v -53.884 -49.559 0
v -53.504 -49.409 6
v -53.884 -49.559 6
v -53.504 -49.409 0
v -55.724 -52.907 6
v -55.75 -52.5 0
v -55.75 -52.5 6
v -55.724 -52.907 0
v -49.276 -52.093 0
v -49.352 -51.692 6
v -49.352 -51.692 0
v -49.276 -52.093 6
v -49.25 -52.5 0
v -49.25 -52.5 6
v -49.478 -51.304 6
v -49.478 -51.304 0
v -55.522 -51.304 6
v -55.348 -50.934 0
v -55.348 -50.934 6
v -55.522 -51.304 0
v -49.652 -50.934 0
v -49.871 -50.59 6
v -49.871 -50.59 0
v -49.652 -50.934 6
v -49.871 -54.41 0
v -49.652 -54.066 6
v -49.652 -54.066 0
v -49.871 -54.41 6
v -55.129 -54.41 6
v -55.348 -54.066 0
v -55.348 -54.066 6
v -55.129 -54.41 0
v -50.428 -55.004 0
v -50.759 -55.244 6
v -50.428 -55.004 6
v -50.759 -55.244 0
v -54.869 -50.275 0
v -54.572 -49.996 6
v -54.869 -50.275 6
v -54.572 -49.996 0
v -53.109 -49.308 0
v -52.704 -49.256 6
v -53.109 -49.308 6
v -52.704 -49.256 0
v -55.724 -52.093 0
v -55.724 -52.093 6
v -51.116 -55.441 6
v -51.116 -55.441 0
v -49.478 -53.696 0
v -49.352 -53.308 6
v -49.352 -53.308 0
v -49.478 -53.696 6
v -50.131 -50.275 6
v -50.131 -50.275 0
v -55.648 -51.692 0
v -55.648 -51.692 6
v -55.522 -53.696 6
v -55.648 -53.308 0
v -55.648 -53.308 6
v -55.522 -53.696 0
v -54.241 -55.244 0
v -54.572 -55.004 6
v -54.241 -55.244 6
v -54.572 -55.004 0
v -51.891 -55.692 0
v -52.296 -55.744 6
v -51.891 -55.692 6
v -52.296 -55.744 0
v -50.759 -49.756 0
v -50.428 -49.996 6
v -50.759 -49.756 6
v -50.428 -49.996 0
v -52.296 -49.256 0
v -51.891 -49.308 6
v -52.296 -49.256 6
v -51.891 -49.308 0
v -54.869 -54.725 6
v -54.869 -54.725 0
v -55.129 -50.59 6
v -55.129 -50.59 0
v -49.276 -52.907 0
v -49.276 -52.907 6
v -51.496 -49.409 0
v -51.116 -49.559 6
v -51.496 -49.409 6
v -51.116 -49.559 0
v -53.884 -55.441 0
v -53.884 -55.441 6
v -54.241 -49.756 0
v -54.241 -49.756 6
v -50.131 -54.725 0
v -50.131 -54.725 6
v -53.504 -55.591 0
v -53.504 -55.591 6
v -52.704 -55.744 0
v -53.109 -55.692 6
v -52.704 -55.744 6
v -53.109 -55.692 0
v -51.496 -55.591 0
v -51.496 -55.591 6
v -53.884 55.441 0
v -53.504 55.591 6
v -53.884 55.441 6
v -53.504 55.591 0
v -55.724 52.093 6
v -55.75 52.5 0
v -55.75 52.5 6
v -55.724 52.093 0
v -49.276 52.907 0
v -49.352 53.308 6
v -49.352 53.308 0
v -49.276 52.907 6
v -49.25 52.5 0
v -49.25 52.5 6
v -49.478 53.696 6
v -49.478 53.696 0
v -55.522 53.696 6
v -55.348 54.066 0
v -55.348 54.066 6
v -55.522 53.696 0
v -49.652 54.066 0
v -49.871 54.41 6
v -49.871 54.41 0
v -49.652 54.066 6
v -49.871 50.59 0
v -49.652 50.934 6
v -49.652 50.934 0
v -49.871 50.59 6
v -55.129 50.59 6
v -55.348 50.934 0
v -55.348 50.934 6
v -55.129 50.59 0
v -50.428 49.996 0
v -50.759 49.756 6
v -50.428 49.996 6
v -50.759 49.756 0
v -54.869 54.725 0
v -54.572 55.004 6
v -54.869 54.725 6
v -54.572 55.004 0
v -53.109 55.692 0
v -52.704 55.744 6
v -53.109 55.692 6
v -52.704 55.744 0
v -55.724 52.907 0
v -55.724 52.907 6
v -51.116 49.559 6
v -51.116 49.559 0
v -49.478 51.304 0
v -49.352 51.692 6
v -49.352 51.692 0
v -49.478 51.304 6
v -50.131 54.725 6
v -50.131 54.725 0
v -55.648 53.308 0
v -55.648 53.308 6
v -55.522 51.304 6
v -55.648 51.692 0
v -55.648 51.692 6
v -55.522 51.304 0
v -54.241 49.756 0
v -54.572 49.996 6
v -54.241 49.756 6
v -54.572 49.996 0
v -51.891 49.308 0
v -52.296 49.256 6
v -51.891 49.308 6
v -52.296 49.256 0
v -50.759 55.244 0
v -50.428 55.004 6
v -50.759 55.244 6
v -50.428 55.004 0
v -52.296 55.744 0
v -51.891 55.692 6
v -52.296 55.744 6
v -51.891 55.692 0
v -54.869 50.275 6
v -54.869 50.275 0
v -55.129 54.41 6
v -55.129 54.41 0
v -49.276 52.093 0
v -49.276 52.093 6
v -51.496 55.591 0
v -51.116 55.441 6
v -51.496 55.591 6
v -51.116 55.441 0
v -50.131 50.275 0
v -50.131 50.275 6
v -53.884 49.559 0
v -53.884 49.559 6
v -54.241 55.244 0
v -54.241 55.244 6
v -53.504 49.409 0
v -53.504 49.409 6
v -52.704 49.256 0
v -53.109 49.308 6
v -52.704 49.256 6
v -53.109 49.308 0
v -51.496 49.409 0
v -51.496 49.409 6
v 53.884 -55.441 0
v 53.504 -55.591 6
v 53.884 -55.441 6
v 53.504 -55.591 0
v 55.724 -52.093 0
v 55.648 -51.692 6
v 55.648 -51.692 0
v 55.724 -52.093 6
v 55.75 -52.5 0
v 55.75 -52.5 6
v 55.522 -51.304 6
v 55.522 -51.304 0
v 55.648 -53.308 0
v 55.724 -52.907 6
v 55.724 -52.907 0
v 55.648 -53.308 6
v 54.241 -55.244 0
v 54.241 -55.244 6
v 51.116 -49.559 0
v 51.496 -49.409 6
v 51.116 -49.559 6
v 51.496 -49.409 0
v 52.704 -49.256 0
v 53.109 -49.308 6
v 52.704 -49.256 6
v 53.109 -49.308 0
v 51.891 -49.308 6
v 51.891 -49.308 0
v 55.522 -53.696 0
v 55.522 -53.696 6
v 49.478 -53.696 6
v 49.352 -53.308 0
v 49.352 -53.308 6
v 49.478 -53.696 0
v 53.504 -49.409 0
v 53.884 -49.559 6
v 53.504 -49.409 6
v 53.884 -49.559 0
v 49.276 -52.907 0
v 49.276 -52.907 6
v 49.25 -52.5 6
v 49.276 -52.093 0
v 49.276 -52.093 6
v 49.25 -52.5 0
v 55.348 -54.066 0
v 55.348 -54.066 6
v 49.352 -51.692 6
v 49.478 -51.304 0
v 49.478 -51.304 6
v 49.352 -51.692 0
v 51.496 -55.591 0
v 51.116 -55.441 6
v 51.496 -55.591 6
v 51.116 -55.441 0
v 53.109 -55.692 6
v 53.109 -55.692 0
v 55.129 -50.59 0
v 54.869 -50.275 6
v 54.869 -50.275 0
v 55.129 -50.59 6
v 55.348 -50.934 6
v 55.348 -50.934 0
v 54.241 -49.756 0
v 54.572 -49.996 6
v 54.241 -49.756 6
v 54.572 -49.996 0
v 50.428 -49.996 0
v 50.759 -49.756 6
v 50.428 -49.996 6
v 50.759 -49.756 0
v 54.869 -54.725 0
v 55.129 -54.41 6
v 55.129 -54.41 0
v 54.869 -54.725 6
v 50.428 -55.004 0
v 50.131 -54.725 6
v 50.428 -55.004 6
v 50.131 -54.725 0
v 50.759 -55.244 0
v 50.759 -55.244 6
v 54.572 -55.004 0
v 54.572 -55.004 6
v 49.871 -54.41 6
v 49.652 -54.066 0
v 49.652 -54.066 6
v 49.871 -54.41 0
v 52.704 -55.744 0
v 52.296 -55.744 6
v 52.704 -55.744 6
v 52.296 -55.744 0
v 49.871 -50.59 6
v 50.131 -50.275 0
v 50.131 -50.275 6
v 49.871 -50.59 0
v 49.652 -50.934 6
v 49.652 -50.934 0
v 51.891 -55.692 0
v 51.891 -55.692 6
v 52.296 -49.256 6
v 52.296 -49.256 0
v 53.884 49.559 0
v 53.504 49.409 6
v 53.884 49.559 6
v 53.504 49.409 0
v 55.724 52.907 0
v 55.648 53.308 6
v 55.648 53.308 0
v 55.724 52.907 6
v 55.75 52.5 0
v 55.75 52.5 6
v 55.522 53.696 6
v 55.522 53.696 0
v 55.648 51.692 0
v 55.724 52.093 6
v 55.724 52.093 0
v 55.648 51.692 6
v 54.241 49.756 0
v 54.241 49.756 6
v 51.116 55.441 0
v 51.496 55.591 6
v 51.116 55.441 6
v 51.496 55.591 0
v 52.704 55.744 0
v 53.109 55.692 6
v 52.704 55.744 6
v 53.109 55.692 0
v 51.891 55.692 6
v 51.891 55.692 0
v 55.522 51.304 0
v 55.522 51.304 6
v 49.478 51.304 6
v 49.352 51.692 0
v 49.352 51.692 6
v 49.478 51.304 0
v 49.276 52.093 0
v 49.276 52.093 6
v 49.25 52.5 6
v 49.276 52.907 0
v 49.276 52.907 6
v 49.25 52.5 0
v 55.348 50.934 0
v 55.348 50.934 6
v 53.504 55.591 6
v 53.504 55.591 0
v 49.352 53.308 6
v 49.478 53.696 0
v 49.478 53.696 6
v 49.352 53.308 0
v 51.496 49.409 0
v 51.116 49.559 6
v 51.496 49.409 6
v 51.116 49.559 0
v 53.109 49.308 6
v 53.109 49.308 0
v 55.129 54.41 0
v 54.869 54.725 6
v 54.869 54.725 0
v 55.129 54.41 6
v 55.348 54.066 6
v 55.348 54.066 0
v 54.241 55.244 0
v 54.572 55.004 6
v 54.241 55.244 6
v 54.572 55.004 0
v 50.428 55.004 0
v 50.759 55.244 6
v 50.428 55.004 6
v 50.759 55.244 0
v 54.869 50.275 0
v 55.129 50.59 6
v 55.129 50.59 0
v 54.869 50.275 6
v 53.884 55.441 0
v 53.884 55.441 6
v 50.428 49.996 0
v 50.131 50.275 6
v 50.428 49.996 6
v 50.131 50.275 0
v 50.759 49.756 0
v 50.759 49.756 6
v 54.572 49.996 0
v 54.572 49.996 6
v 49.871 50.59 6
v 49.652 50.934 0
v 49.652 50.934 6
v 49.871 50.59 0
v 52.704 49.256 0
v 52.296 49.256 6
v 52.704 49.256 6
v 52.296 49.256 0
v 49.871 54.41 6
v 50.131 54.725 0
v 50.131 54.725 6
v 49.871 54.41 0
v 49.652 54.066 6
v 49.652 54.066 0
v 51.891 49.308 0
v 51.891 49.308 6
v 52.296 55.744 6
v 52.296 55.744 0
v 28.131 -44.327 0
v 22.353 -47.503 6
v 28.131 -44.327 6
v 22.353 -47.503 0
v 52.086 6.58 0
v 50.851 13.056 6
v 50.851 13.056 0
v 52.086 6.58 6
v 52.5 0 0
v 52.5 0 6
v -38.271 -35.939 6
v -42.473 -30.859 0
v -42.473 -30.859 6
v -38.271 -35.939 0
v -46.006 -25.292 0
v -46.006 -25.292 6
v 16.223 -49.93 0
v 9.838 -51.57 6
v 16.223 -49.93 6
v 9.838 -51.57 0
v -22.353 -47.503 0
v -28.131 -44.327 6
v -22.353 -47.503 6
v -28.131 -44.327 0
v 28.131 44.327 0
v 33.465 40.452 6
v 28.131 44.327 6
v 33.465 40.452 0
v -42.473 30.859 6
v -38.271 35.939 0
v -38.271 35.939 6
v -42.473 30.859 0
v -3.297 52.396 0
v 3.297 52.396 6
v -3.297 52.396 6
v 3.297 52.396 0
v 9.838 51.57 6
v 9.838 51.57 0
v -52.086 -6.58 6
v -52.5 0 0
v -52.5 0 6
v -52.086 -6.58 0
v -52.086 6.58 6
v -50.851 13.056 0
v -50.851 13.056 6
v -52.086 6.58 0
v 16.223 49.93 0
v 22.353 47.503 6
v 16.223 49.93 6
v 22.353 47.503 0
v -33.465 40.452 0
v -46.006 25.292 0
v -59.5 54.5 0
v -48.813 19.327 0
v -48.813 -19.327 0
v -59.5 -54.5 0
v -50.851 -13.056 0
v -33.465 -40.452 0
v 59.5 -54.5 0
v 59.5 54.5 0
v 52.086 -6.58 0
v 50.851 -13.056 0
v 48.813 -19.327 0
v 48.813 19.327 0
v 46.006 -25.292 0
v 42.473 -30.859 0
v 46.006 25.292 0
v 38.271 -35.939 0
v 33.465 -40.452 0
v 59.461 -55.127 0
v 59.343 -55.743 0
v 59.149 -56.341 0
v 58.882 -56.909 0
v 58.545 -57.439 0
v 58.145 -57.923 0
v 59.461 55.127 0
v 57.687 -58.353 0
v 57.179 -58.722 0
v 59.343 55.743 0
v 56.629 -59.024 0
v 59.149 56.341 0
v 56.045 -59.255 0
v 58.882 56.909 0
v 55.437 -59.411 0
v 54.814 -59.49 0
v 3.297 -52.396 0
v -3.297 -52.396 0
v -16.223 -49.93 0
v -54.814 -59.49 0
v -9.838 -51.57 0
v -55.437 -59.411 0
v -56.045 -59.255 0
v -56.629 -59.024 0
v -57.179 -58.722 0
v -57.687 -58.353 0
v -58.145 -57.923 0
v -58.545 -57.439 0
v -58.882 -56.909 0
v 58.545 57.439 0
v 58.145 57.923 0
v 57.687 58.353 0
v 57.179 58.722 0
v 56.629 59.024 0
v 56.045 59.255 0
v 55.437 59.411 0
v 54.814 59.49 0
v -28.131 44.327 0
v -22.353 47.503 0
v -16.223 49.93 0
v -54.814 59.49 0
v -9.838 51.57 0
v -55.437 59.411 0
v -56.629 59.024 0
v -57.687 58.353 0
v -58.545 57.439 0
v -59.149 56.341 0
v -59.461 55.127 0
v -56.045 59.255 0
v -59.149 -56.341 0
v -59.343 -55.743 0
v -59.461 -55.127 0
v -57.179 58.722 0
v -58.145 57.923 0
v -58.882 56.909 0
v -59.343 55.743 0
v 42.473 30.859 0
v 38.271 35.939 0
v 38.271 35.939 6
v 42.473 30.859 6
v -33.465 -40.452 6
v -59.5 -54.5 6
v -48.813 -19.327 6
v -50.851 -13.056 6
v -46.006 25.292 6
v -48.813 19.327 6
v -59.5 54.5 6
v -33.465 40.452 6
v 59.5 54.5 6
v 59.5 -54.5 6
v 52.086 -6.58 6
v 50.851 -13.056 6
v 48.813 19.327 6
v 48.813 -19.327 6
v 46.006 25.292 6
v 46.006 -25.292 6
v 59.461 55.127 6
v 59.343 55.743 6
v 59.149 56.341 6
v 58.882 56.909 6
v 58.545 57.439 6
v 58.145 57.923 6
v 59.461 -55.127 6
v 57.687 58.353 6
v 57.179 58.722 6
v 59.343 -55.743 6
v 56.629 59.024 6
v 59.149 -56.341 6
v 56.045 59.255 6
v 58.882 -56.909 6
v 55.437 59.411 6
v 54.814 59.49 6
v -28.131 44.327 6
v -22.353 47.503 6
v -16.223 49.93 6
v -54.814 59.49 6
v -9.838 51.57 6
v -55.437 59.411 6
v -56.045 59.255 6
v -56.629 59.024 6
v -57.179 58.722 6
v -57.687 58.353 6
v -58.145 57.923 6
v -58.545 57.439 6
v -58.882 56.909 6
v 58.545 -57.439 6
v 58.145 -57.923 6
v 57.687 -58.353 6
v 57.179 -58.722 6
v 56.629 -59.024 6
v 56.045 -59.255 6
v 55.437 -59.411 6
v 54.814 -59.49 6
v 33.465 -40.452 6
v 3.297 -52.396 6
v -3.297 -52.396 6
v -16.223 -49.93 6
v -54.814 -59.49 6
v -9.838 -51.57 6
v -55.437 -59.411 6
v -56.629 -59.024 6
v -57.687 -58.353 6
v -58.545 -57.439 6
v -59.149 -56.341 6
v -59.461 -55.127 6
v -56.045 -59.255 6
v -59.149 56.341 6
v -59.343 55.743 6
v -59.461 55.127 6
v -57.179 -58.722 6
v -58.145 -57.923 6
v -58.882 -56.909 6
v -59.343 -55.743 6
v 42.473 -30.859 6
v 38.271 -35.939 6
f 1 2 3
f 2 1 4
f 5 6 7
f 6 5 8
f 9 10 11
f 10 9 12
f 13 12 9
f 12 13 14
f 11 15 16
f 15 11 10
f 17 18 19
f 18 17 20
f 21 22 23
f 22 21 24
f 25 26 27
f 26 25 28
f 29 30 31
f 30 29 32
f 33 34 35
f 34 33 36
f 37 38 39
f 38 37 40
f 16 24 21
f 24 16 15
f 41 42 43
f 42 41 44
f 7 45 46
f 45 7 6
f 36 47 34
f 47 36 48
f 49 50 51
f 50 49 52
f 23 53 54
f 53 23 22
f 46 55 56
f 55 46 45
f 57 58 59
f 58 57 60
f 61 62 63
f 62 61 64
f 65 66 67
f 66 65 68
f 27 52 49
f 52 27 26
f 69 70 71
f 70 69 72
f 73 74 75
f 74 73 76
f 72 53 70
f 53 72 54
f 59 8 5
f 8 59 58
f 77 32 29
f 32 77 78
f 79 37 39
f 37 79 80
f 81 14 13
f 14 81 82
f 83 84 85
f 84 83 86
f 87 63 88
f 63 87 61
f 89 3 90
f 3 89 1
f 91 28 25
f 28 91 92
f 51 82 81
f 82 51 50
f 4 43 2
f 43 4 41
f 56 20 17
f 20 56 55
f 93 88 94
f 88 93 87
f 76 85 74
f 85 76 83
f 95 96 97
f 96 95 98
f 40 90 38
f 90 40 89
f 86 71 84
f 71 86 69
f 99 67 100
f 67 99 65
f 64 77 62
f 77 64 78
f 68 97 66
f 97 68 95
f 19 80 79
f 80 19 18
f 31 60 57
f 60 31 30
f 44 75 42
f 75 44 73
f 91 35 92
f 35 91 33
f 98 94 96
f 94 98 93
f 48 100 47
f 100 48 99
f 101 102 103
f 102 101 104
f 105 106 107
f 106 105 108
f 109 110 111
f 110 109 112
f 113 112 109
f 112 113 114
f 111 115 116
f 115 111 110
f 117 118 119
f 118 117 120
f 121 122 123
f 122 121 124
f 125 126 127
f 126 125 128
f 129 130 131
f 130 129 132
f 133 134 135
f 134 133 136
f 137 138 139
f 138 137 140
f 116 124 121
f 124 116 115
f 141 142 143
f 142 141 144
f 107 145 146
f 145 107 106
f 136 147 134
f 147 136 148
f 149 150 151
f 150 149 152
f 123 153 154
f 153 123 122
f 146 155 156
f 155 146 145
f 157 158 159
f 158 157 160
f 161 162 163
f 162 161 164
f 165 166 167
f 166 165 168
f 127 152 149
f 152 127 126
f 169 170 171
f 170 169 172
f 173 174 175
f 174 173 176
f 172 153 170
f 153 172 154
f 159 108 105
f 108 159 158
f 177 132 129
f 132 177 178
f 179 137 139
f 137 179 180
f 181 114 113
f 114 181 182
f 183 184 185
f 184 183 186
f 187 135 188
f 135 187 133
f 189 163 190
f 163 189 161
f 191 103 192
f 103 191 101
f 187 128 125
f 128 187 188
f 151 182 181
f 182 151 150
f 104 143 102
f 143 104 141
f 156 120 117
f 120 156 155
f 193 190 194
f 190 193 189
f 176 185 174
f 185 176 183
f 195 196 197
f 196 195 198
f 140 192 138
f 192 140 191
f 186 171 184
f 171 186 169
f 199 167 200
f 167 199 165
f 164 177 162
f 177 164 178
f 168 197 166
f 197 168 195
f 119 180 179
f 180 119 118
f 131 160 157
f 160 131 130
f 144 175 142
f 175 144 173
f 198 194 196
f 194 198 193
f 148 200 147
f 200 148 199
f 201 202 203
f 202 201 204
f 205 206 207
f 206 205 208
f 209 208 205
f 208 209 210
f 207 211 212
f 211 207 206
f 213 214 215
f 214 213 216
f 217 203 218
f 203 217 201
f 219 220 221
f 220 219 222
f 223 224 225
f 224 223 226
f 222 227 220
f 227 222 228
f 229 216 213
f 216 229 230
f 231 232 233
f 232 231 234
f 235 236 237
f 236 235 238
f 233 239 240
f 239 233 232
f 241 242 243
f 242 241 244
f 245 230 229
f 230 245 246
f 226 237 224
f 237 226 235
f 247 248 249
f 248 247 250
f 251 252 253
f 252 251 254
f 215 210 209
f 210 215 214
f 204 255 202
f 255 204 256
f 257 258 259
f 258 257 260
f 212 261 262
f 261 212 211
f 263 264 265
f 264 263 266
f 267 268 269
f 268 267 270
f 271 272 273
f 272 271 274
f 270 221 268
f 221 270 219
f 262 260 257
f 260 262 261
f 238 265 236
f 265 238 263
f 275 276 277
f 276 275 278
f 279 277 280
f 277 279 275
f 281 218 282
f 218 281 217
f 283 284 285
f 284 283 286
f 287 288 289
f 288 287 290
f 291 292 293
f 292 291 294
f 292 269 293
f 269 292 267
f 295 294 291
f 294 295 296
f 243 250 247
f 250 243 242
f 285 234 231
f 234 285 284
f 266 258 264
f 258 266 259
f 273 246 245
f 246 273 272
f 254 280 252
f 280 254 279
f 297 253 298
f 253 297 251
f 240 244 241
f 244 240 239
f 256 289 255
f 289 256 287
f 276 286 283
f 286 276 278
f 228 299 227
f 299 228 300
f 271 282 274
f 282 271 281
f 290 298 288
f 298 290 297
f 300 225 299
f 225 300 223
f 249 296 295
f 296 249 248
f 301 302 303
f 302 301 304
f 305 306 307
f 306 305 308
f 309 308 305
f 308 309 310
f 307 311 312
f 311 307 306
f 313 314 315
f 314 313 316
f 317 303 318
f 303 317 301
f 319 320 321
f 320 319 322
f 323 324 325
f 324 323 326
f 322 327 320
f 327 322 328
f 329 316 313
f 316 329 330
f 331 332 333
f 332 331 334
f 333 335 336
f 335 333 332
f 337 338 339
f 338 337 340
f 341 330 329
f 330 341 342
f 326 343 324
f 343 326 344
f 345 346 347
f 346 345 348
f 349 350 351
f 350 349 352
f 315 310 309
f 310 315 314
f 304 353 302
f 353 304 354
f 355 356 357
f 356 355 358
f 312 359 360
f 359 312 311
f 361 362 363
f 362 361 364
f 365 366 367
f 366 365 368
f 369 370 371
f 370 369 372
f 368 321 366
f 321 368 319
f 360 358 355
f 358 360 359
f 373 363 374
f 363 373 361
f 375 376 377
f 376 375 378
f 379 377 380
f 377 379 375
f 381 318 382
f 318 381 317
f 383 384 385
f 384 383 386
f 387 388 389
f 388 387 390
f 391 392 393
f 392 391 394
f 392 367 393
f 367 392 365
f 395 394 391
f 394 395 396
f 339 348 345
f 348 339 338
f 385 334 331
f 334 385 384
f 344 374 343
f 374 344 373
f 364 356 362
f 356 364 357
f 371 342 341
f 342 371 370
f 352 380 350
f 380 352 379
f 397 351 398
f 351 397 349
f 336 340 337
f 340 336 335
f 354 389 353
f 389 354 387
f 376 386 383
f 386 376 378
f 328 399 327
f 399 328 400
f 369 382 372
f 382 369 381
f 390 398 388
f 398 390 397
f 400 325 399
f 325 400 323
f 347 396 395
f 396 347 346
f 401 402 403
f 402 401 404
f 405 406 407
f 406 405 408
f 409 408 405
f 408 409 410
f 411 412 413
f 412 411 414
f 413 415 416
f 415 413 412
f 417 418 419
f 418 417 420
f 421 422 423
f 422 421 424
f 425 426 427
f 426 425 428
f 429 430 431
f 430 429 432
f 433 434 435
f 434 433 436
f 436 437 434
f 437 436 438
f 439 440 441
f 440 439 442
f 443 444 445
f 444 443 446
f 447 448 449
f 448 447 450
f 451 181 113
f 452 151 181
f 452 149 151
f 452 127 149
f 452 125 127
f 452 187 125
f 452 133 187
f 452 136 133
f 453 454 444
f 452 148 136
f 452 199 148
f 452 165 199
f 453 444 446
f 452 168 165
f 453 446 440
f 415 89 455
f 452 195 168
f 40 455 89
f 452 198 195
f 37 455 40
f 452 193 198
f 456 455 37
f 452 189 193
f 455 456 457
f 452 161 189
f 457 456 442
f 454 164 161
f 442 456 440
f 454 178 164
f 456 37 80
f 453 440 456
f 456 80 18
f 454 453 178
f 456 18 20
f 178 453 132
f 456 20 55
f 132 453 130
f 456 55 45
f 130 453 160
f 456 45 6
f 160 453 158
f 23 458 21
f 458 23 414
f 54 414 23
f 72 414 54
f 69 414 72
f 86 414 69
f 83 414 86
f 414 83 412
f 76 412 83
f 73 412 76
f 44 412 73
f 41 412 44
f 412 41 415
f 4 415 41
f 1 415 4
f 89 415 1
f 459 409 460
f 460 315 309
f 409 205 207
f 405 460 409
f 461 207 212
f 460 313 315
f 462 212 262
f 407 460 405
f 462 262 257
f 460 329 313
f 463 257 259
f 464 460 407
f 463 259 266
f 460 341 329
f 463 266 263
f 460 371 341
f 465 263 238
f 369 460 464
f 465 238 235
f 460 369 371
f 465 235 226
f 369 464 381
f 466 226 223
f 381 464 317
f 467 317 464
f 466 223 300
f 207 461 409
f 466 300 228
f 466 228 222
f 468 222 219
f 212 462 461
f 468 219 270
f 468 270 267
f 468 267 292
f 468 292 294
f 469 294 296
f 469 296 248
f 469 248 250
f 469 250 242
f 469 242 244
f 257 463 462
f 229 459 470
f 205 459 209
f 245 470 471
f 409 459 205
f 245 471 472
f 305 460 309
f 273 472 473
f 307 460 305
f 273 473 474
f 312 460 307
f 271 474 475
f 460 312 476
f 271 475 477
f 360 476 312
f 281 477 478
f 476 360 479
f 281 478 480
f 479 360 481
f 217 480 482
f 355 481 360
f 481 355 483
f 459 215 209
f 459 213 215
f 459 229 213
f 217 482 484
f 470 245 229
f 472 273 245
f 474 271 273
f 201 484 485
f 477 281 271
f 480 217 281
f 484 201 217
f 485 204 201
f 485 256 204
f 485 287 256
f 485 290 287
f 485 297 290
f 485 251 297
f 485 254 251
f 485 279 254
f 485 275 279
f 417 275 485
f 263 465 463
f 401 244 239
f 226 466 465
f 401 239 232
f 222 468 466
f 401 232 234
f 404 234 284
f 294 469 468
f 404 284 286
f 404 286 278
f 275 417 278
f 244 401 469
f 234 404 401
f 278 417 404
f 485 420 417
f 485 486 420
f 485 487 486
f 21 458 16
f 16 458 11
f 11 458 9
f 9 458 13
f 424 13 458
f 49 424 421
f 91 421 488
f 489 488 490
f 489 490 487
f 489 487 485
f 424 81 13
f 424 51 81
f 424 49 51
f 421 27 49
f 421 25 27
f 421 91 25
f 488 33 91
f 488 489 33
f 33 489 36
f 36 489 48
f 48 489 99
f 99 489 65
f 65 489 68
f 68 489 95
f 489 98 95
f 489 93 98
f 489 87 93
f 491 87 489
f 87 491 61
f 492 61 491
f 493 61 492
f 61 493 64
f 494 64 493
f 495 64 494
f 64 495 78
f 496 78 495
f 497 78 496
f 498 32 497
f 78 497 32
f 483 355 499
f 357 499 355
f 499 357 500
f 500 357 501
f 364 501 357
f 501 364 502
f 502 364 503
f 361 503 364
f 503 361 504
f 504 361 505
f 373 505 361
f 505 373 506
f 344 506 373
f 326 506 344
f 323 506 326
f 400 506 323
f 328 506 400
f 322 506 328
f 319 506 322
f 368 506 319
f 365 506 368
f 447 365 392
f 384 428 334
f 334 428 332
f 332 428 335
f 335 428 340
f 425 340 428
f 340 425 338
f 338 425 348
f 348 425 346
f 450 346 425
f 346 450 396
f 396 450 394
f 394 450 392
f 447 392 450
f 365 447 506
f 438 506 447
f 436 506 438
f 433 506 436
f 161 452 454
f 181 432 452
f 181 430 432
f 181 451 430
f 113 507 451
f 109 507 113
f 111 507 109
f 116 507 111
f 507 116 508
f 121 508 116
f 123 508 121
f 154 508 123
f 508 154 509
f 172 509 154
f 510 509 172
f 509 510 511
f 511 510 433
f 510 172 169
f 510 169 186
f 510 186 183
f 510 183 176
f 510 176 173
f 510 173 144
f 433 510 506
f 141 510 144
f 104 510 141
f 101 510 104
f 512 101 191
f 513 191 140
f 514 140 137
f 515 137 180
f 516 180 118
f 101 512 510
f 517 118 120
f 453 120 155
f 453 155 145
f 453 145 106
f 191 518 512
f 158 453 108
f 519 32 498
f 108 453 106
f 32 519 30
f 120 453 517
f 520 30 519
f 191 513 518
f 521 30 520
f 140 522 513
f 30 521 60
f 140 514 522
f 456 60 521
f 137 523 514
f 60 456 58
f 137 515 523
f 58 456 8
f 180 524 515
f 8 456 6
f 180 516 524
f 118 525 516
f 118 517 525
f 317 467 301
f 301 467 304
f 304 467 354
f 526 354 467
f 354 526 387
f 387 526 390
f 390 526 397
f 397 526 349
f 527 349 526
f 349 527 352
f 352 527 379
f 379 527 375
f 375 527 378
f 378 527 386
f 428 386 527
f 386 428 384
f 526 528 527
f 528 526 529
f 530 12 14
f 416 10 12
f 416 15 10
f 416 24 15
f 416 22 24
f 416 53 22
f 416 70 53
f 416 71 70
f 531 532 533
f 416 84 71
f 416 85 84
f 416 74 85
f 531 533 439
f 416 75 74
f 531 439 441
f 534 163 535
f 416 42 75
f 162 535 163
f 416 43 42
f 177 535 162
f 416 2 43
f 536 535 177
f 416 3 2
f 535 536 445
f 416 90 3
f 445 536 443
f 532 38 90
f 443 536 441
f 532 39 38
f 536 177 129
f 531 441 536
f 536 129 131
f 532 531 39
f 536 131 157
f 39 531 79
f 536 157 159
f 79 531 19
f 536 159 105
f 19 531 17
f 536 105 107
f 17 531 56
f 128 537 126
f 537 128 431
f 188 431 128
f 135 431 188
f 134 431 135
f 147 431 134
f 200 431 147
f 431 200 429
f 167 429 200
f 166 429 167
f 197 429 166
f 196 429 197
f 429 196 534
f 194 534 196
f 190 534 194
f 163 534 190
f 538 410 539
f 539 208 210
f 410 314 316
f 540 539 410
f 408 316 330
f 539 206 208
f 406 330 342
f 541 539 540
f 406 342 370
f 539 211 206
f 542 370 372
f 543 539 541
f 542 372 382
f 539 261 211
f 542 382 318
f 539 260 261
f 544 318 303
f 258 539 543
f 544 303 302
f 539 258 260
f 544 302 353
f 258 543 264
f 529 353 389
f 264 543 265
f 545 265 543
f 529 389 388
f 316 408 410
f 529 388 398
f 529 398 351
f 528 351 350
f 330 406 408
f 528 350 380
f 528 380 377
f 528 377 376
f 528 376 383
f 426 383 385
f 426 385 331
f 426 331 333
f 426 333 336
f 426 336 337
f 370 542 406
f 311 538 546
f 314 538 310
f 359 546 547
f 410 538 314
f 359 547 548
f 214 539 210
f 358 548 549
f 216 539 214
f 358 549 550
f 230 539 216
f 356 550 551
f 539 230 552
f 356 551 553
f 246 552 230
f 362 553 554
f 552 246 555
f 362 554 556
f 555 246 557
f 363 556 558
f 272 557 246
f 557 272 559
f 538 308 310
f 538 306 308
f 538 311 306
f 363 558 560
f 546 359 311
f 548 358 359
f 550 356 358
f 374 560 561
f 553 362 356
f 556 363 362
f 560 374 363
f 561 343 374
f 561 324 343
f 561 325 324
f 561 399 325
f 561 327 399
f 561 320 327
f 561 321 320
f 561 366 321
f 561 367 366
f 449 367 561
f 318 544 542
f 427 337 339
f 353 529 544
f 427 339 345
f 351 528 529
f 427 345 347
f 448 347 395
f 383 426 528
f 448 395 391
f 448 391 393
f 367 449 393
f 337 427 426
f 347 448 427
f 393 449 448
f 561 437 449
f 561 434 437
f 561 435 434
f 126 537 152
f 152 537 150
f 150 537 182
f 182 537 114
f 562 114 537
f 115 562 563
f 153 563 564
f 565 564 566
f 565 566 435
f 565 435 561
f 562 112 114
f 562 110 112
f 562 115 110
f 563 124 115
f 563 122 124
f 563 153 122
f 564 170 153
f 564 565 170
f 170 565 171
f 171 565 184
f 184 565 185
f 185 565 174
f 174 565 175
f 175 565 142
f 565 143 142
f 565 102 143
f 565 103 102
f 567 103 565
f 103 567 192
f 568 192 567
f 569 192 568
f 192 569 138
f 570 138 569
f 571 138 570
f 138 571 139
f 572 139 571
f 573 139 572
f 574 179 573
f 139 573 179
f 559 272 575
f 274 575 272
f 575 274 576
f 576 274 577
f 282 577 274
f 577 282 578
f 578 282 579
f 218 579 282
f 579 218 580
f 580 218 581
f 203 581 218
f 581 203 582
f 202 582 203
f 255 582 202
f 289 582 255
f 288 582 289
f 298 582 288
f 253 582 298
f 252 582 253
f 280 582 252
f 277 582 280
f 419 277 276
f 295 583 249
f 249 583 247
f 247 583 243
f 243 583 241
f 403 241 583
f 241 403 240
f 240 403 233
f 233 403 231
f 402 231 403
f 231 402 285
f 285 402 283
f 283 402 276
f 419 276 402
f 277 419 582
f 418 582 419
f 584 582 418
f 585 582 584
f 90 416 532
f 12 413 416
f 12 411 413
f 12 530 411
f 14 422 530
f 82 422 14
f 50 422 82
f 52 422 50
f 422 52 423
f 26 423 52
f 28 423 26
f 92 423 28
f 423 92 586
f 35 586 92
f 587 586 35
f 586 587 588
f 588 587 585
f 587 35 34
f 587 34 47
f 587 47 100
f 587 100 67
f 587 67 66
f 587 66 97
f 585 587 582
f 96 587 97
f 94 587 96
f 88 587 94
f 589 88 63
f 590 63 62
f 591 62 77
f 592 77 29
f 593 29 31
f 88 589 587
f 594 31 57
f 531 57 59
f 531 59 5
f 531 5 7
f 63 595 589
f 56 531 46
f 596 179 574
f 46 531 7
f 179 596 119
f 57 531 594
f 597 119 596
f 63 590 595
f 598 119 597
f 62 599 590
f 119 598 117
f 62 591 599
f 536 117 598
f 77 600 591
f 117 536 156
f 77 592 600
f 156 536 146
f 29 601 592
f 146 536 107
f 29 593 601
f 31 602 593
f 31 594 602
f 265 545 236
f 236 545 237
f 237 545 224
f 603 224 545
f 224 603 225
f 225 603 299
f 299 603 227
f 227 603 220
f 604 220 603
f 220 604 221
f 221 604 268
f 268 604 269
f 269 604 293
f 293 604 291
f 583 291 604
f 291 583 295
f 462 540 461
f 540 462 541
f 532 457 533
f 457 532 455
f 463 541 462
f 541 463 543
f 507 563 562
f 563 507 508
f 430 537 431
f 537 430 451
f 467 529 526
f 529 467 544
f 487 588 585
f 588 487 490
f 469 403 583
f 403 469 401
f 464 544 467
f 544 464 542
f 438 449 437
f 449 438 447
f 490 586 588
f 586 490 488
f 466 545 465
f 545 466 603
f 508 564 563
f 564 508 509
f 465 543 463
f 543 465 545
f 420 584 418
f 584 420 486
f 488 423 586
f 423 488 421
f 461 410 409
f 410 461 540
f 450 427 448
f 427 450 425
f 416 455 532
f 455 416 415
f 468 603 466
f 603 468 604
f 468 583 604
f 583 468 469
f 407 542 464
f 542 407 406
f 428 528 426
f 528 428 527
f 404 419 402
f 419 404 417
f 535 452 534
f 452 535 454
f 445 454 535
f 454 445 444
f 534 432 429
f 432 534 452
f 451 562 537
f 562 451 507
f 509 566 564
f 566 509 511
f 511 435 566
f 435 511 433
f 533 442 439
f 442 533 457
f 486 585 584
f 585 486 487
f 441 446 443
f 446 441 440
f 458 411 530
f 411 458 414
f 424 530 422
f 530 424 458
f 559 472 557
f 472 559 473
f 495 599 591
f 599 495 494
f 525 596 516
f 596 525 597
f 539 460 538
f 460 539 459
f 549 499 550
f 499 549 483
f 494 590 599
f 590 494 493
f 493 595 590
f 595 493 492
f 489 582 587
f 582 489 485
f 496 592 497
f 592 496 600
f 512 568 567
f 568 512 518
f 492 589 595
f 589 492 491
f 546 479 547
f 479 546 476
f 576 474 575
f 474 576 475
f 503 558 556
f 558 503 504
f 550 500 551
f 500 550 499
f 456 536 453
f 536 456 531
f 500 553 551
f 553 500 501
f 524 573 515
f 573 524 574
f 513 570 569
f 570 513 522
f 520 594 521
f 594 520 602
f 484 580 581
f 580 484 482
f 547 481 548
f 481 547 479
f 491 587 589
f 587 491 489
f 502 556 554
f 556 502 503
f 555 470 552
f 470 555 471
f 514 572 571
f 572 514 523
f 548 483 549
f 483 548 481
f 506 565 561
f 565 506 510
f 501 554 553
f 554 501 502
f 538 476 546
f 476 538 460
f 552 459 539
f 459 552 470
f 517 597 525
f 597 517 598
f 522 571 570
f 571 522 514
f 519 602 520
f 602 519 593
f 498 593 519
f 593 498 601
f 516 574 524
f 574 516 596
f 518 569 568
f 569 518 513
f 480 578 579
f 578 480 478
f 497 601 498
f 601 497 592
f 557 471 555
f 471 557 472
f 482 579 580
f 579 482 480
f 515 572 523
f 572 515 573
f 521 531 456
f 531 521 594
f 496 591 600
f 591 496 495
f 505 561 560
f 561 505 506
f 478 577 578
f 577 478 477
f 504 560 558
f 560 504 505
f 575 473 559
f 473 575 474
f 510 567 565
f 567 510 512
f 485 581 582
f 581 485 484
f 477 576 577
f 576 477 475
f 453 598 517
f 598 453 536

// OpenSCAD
$fn = 50;

difference() {
	union() {
		hull() {
			translate(v = [-54.5, 54.5, 0]) {
				cylinder(h = 6, r = 5);
			}
			translate(v = [54.5, 54.5, 0]) {
				cylinder(h = 6, r = 5);
			}
			translate(v = [-54.5, -54.5, 0]) {
				cylinder(h = 6, r = 5);
			}
			translate(v = [54.5, -54.5, 0]) {
				cylinder(h = 6, r = 5);
			}
		}
	}
	union() {
		translate(v = [-52.5, -52.5, -100.0]) {
			cylinder(h = 200, r = 3.25);
		}
		translate(v = [-52.5, 52.5, -100.0]) {
			cylinder(h = 200, r = 3.25);
		}
		translate(v = [52.5, -52.5, -100.0]) {
			cylinder(h = 200, r = 3.25);
		}
		translate(v = [52.5, 52.5, -100.0]) {
			cylinder(h = 200, r = 3.25);
		}
		translate(v = [-52.5, -52.5, -100.0]) {
			cylinder(h = 200, r = 1.8);
		}
		translate(v = [-52.5, 52.5, -100.0]) {
			cylinder(h = 200, r = 1.8);
		}
		translate(v = [52.5, -52.5, -100.0]) {
			cylinder(h = 200, r = 1.8);
		}
		translate(v = [52.5, 52.5, -100.0]) {
			cylinder(h = 200, r = 1.8);
		}
		cylinder(h = 6, r = 52.5);
	}
}
